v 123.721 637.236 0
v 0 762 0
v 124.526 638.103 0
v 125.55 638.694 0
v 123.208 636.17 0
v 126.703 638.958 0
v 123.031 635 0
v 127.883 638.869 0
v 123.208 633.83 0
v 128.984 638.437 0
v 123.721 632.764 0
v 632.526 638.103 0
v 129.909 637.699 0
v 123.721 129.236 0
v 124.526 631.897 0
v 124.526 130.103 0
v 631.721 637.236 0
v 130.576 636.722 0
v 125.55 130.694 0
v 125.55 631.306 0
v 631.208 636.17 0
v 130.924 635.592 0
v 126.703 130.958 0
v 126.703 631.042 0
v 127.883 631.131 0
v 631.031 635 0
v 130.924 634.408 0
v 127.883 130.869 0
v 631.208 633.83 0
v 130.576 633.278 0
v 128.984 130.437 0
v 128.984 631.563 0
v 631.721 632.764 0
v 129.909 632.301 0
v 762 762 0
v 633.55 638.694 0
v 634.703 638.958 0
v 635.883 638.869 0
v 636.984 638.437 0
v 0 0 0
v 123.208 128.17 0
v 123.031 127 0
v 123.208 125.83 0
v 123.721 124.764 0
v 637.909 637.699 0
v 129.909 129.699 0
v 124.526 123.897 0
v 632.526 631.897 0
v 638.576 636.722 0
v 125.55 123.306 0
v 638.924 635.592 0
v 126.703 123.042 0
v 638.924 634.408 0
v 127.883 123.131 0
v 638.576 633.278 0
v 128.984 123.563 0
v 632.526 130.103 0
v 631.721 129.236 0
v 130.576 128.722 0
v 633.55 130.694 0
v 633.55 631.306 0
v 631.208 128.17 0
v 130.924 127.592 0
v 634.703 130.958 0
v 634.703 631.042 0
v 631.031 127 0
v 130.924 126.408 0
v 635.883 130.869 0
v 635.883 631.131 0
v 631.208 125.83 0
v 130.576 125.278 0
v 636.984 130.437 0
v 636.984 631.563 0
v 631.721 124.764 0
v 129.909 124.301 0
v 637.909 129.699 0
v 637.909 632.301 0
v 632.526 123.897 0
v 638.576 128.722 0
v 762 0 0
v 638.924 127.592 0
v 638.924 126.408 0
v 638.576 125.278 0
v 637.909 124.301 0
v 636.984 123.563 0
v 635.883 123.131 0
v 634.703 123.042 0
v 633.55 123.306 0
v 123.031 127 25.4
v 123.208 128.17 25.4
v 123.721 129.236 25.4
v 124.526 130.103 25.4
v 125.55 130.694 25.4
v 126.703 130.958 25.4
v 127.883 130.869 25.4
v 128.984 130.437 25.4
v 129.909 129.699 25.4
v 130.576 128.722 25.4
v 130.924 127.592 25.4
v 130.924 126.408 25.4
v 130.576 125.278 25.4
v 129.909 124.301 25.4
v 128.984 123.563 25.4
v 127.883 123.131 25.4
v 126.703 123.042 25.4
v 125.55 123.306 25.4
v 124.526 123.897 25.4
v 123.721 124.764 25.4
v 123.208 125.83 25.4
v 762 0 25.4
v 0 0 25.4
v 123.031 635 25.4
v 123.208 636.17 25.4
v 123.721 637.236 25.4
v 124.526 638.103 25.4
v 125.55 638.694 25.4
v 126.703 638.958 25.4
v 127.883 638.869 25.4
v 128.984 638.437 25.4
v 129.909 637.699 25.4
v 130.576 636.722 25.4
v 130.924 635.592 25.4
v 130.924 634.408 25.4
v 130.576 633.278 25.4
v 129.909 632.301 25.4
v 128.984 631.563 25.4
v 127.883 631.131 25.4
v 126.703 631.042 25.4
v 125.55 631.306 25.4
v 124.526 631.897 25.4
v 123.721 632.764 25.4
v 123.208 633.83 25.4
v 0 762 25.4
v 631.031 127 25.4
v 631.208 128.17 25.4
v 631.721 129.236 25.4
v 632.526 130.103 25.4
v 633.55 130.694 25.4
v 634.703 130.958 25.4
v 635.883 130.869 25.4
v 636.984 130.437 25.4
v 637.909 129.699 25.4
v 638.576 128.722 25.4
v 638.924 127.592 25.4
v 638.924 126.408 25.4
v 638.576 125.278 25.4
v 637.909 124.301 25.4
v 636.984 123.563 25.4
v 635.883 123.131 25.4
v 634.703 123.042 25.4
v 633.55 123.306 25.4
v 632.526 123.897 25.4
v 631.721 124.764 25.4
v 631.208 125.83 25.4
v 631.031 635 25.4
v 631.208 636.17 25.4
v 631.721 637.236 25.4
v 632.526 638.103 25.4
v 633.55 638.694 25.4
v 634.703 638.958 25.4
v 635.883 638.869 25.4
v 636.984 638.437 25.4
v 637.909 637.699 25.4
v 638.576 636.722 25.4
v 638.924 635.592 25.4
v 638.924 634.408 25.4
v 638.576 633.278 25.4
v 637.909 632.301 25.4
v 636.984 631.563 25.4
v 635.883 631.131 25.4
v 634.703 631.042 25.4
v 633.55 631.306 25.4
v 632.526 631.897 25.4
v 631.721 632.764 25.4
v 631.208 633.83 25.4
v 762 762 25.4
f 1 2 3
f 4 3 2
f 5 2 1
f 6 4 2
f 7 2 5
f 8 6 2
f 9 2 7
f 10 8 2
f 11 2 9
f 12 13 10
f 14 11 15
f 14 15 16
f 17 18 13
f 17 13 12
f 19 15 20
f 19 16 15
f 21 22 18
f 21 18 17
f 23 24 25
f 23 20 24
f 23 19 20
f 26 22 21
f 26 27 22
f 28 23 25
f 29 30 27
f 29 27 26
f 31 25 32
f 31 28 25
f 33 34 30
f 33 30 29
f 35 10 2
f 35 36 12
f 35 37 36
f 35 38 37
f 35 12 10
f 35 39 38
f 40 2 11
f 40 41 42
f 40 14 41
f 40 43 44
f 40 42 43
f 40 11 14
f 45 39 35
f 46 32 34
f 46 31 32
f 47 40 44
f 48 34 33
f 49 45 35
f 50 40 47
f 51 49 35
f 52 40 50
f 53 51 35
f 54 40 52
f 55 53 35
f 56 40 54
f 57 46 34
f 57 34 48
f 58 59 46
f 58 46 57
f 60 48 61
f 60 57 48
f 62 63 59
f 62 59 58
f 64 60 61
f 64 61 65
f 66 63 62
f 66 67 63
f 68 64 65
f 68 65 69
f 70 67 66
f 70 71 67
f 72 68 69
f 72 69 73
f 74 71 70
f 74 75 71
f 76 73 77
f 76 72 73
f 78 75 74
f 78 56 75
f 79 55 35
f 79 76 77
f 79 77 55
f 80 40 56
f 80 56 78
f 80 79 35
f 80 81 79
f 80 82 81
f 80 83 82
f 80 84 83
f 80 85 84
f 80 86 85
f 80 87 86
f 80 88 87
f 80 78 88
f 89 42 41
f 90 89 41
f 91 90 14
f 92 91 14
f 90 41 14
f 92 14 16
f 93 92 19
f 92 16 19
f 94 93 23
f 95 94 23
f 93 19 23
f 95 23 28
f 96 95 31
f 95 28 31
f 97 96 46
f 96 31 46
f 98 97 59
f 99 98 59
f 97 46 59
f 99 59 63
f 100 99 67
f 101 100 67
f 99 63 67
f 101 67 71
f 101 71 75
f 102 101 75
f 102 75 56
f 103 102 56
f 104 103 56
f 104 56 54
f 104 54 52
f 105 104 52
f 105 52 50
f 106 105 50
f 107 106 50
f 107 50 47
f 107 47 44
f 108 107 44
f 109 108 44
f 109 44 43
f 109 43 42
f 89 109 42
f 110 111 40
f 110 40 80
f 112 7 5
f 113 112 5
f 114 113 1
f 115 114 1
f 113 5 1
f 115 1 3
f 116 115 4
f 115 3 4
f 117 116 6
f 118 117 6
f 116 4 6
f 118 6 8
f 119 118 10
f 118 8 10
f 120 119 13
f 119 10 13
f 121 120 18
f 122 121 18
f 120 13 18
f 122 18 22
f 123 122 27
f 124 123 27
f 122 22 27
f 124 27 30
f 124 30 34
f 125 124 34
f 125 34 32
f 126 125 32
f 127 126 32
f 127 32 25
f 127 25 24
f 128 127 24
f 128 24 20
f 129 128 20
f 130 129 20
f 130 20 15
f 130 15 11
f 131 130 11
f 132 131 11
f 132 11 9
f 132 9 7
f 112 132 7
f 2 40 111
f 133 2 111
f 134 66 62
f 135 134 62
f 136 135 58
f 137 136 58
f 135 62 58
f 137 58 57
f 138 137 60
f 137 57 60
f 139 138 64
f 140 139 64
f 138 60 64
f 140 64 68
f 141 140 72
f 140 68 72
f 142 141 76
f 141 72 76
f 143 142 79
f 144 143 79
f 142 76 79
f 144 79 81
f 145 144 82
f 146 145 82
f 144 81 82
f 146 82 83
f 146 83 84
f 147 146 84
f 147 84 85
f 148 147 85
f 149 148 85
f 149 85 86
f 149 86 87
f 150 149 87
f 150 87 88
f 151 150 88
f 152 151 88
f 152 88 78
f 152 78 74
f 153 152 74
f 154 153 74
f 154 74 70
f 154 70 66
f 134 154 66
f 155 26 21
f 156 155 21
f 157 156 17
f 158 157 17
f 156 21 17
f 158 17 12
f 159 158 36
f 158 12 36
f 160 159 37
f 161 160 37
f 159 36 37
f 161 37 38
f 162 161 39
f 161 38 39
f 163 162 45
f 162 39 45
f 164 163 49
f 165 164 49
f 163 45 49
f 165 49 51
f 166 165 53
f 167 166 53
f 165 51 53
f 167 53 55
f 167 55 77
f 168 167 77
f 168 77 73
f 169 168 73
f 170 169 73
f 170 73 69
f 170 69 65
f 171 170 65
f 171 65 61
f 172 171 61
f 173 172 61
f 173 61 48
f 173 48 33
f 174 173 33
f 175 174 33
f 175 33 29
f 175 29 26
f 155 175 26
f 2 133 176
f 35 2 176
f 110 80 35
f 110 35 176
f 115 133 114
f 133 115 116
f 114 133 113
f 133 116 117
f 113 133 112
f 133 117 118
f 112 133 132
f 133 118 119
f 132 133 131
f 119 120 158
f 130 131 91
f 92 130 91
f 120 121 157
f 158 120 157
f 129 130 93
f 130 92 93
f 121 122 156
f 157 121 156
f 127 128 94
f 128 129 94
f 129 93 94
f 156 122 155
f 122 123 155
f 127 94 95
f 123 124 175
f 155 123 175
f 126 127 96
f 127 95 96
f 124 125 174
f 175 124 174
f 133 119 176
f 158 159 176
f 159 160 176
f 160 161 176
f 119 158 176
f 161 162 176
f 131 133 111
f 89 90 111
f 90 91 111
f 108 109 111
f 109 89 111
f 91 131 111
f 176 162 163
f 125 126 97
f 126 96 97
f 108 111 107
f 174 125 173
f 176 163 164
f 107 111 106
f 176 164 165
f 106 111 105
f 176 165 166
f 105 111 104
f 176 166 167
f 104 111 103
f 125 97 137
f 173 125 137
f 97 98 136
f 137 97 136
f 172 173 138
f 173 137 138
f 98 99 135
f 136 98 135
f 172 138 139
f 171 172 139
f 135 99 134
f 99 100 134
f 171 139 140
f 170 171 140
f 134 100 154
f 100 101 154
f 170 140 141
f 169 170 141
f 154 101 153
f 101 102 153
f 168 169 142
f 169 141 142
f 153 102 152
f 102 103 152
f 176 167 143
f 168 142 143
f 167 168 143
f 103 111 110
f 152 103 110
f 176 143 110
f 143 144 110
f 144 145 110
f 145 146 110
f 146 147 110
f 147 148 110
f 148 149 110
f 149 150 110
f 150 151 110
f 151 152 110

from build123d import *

# Parameters (mm, degrees)
F0_W     = 762
F0_H     = 25.4
F1_DEPTH = 762
F3_D     = 7.9375


with BuildPart() as f1:
    # F0 (on Front) → F1 (new body)
    with BuildSketch(Plane.XZ):
        with Locations((381, 12.7)):
            Rectangle(F0_W, F0_H)
    extrude(amount=-F1_DEPTH)

    # F3 (through all)
    with Locations(Plane.XY.offset(25.4)):
        with Locations((635, 127), (635, 635), (127, 127), (127, 635)):
            Hole(F3_D / 2)


solid = f1.part
